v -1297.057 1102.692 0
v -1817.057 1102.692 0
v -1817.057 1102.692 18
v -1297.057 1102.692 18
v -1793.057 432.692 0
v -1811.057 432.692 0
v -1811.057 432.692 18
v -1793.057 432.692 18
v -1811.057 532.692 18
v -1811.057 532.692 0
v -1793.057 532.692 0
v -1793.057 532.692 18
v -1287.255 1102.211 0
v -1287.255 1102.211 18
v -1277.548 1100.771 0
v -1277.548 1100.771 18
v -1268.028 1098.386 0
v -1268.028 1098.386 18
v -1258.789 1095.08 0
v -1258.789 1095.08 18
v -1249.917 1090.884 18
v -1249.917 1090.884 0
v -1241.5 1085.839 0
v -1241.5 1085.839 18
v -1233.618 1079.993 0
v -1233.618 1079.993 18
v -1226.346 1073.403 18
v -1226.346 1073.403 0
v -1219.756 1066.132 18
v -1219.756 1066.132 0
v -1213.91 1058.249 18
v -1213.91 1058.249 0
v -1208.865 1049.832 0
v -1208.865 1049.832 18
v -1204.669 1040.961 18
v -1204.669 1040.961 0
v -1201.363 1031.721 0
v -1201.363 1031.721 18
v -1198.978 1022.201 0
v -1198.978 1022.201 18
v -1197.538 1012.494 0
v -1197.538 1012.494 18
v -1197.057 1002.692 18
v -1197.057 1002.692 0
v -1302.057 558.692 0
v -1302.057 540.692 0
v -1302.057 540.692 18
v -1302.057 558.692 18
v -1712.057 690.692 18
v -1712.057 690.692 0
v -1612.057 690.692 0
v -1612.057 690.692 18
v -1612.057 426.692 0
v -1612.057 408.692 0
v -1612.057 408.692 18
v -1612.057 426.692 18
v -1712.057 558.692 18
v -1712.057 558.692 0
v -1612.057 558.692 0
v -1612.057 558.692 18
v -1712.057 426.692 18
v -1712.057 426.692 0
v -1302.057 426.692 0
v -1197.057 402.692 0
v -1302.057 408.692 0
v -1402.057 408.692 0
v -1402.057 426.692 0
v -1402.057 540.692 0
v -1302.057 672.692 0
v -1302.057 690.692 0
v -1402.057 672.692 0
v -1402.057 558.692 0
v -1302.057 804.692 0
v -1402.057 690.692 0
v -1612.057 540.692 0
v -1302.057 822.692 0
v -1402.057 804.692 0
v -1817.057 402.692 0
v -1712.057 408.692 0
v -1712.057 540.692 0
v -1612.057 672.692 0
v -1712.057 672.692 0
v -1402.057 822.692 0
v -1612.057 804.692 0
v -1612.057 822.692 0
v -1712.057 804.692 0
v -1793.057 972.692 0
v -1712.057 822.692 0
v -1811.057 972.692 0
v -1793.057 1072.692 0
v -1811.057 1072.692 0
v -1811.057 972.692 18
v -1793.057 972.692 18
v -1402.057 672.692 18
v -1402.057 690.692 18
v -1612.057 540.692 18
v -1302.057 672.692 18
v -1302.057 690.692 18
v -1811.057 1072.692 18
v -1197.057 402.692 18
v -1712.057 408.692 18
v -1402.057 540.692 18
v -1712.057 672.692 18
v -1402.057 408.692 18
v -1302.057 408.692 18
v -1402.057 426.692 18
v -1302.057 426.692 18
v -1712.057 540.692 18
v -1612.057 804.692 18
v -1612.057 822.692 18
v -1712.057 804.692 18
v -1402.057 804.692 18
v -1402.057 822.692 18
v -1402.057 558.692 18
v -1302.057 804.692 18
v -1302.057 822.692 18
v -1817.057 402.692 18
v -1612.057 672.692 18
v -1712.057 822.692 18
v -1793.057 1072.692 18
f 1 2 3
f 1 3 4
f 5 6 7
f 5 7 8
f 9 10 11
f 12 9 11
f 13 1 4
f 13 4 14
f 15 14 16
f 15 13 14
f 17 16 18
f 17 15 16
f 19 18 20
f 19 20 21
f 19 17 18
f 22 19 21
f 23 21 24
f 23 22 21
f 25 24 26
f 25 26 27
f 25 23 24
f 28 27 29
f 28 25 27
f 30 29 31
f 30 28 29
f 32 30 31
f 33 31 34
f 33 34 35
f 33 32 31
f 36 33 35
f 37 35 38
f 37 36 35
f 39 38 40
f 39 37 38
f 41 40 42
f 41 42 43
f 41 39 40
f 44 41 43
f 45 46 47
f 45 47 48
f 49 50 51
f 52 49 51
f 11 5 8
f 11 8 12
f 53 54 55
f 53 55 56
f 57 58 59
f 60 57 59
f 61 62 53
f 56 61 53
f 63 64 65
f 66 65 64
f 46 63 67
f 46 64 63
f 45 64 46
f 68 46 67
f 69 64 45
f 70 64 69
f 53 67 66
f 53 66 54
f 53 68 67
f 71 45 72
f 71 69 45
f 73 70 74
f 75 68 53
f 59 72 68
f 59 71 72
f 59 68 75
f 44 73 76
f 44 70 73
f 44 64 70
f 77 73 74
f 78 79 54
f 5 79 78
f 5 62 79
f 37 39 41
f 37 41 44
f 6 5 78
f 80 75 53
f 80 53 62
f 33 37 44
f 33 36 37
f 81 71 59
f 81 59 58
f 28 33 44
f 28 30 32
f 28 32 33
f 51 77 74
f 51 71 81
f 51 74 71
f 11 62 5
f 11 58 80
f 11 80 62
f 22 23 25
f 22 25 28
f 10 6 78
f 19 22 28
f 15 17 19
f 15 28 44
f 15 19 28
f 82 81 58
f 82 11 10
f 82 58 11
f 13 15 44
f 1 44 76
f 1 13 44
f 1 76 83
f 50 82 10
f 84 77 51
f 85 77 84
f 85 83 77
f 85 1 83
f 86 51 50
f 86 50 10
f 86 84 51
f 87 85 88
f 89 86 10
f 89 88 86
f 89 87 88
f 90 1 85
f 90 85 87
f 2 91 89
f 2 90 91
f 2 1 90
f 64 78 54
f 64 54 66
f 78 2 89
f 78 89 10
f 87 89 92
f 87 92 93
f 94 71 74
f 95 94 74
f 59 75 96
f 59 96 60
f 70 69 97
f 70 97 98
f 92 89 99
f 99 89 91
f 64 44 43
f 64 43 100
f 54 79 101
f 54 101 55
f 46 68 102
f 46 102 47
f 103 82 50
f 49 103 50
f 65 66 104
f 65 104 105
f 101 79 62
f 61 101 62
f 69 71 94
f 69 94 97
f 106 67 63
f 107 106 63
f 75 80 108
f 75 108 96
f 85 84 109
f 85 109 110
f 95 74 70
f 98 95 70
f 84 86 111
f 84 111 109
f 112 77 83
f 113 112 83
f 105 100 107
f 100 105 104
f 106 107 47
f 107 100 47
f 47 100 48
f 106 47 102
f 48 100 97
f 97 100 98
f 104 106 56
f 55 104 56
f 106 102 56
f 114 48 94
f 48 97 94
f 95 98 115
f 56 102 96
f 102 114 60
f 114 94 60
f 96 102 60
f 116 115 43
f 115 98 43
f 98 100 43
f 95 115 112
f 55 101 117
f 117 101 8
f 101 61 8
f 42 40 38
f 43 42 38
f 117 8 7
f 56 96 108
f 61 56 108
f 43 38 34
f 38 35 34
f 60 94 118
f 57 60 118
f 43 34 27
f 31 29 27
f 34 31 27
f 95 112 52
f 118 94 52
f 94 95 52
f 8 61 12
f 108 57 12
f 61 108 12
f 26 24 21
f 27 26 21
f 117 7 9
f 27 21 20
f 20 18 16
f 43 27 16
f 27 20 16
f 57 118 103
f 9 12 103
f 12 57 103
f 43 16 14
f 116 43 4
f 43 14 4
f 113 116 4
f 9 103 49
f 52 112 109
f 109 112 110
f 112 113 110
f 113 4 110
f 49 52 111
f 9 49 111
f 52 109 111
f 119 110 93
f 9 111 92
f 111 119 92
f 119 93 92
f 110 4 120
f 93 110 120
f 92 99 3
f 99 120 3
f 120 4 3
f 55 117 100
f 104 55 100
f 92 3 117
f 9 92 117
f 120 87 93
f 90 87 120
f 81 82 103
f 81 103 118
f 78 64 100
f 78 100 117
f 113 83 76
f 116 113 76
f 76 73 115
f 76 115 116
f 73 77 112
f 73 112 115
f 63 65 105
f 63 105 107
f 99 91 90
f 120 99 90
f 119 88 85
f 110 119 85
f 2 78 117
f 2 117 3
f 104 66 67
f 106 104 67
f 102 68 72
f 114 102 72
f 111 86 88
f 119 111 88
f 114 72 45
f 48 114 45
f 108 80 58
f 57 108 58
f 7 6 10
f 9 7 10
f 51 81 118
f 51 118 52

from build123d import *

# Parameters (mm, degrees)
SKETCH1_W           = 18
SKETCH1_H           = 100
SKETCH1_W_2         = 100
SKETCH1_H_2         = 18
BOSS_EXTRUDE2_DEPTH = 18


with BuildPart() as part:
    # Sketch1 → Boss-Extrude2 (new body)
    with BuildSketch(Plane.XY):
        with BuildLine():
            Line((-1197.056949538, 402.692318001), (-1817.056949538, 402.692318001))
            Line((-1817.056949538, 402.692318001), (-1817.056949538, 1102.692318001))
            Line((-1817.056949538, 1102.692318001), (-1297.056949538, 1102.692318001))
            ThreePointArc((-1297.056949538, 1102.692318001), (-1226.346271419, 1073.402996119), (-1197.056949538, 1002.692318001))
            Line((-1197.056949538, 1002.692318001), (-1197.056949538, 402.692318001))
        make_face()
        with Locations((-1802.056949538, 1022.692318001)):
            Rectangle(SKETCH1_W, SKETCH1_H, mode=Mode.SUBTRACT)
        with Locations((-1802.056949538, 482.692318001)):
            Rectangle(SKETCH1_W, SKETCH1_H, mode=Mode.SUBTRACT)
        with Locations((-1352.056949538, 417.692318001)):
            Rectangle(SKETCH1_W_2, SKETCH1_H_2, mode=Mode.SUBTRACT)
        with Locations((-1662.056949538, 417.692318001)):
            Rectangle(SKETCH1_W_2, SKETCH1_H_2, mode=Mode.SUBTRACT)
        with Locations((-1662.056949538, 549.692318001)):
            Rectangle(SKETCH1_W_2, SKETCH1_H_2, mode=Mode.SUBTRACT)
        with Locations((-1352.056949538, 549.692318001)):
            Rectangle(SKETCH1_W_2, SKETCH1_H_2, mode=Mode.SUBTRACT)
        with Locations((-1662.056949538, 681.692318001)):
            Rectangle(SKETCH1_W_2, SKETCH1_H_2, mode=Mode.SUBTRACT)
        with Locations((-1352.056949538, 681.692318001)):
            Rectangle(SKETCH1_W_2, SKETCH1_H_2, mode=Mode.SUBTRACT)
        with Locations((-1662.056949538, 813.692318001)):
            Rectangle(SKETCH1_W_2, SKETCH1_H_2, mode=Mode.SUBTRACT)
        with Locations((-1352.056949538, 813.692318001)):
            Rectangle(SKETCH1_W_2, SKETCH1_H_2, mode=Mode.SUBTRACT)
    extrude(amount=BOSS_EXTRUDE2_DEPTH)


solid = part.part
